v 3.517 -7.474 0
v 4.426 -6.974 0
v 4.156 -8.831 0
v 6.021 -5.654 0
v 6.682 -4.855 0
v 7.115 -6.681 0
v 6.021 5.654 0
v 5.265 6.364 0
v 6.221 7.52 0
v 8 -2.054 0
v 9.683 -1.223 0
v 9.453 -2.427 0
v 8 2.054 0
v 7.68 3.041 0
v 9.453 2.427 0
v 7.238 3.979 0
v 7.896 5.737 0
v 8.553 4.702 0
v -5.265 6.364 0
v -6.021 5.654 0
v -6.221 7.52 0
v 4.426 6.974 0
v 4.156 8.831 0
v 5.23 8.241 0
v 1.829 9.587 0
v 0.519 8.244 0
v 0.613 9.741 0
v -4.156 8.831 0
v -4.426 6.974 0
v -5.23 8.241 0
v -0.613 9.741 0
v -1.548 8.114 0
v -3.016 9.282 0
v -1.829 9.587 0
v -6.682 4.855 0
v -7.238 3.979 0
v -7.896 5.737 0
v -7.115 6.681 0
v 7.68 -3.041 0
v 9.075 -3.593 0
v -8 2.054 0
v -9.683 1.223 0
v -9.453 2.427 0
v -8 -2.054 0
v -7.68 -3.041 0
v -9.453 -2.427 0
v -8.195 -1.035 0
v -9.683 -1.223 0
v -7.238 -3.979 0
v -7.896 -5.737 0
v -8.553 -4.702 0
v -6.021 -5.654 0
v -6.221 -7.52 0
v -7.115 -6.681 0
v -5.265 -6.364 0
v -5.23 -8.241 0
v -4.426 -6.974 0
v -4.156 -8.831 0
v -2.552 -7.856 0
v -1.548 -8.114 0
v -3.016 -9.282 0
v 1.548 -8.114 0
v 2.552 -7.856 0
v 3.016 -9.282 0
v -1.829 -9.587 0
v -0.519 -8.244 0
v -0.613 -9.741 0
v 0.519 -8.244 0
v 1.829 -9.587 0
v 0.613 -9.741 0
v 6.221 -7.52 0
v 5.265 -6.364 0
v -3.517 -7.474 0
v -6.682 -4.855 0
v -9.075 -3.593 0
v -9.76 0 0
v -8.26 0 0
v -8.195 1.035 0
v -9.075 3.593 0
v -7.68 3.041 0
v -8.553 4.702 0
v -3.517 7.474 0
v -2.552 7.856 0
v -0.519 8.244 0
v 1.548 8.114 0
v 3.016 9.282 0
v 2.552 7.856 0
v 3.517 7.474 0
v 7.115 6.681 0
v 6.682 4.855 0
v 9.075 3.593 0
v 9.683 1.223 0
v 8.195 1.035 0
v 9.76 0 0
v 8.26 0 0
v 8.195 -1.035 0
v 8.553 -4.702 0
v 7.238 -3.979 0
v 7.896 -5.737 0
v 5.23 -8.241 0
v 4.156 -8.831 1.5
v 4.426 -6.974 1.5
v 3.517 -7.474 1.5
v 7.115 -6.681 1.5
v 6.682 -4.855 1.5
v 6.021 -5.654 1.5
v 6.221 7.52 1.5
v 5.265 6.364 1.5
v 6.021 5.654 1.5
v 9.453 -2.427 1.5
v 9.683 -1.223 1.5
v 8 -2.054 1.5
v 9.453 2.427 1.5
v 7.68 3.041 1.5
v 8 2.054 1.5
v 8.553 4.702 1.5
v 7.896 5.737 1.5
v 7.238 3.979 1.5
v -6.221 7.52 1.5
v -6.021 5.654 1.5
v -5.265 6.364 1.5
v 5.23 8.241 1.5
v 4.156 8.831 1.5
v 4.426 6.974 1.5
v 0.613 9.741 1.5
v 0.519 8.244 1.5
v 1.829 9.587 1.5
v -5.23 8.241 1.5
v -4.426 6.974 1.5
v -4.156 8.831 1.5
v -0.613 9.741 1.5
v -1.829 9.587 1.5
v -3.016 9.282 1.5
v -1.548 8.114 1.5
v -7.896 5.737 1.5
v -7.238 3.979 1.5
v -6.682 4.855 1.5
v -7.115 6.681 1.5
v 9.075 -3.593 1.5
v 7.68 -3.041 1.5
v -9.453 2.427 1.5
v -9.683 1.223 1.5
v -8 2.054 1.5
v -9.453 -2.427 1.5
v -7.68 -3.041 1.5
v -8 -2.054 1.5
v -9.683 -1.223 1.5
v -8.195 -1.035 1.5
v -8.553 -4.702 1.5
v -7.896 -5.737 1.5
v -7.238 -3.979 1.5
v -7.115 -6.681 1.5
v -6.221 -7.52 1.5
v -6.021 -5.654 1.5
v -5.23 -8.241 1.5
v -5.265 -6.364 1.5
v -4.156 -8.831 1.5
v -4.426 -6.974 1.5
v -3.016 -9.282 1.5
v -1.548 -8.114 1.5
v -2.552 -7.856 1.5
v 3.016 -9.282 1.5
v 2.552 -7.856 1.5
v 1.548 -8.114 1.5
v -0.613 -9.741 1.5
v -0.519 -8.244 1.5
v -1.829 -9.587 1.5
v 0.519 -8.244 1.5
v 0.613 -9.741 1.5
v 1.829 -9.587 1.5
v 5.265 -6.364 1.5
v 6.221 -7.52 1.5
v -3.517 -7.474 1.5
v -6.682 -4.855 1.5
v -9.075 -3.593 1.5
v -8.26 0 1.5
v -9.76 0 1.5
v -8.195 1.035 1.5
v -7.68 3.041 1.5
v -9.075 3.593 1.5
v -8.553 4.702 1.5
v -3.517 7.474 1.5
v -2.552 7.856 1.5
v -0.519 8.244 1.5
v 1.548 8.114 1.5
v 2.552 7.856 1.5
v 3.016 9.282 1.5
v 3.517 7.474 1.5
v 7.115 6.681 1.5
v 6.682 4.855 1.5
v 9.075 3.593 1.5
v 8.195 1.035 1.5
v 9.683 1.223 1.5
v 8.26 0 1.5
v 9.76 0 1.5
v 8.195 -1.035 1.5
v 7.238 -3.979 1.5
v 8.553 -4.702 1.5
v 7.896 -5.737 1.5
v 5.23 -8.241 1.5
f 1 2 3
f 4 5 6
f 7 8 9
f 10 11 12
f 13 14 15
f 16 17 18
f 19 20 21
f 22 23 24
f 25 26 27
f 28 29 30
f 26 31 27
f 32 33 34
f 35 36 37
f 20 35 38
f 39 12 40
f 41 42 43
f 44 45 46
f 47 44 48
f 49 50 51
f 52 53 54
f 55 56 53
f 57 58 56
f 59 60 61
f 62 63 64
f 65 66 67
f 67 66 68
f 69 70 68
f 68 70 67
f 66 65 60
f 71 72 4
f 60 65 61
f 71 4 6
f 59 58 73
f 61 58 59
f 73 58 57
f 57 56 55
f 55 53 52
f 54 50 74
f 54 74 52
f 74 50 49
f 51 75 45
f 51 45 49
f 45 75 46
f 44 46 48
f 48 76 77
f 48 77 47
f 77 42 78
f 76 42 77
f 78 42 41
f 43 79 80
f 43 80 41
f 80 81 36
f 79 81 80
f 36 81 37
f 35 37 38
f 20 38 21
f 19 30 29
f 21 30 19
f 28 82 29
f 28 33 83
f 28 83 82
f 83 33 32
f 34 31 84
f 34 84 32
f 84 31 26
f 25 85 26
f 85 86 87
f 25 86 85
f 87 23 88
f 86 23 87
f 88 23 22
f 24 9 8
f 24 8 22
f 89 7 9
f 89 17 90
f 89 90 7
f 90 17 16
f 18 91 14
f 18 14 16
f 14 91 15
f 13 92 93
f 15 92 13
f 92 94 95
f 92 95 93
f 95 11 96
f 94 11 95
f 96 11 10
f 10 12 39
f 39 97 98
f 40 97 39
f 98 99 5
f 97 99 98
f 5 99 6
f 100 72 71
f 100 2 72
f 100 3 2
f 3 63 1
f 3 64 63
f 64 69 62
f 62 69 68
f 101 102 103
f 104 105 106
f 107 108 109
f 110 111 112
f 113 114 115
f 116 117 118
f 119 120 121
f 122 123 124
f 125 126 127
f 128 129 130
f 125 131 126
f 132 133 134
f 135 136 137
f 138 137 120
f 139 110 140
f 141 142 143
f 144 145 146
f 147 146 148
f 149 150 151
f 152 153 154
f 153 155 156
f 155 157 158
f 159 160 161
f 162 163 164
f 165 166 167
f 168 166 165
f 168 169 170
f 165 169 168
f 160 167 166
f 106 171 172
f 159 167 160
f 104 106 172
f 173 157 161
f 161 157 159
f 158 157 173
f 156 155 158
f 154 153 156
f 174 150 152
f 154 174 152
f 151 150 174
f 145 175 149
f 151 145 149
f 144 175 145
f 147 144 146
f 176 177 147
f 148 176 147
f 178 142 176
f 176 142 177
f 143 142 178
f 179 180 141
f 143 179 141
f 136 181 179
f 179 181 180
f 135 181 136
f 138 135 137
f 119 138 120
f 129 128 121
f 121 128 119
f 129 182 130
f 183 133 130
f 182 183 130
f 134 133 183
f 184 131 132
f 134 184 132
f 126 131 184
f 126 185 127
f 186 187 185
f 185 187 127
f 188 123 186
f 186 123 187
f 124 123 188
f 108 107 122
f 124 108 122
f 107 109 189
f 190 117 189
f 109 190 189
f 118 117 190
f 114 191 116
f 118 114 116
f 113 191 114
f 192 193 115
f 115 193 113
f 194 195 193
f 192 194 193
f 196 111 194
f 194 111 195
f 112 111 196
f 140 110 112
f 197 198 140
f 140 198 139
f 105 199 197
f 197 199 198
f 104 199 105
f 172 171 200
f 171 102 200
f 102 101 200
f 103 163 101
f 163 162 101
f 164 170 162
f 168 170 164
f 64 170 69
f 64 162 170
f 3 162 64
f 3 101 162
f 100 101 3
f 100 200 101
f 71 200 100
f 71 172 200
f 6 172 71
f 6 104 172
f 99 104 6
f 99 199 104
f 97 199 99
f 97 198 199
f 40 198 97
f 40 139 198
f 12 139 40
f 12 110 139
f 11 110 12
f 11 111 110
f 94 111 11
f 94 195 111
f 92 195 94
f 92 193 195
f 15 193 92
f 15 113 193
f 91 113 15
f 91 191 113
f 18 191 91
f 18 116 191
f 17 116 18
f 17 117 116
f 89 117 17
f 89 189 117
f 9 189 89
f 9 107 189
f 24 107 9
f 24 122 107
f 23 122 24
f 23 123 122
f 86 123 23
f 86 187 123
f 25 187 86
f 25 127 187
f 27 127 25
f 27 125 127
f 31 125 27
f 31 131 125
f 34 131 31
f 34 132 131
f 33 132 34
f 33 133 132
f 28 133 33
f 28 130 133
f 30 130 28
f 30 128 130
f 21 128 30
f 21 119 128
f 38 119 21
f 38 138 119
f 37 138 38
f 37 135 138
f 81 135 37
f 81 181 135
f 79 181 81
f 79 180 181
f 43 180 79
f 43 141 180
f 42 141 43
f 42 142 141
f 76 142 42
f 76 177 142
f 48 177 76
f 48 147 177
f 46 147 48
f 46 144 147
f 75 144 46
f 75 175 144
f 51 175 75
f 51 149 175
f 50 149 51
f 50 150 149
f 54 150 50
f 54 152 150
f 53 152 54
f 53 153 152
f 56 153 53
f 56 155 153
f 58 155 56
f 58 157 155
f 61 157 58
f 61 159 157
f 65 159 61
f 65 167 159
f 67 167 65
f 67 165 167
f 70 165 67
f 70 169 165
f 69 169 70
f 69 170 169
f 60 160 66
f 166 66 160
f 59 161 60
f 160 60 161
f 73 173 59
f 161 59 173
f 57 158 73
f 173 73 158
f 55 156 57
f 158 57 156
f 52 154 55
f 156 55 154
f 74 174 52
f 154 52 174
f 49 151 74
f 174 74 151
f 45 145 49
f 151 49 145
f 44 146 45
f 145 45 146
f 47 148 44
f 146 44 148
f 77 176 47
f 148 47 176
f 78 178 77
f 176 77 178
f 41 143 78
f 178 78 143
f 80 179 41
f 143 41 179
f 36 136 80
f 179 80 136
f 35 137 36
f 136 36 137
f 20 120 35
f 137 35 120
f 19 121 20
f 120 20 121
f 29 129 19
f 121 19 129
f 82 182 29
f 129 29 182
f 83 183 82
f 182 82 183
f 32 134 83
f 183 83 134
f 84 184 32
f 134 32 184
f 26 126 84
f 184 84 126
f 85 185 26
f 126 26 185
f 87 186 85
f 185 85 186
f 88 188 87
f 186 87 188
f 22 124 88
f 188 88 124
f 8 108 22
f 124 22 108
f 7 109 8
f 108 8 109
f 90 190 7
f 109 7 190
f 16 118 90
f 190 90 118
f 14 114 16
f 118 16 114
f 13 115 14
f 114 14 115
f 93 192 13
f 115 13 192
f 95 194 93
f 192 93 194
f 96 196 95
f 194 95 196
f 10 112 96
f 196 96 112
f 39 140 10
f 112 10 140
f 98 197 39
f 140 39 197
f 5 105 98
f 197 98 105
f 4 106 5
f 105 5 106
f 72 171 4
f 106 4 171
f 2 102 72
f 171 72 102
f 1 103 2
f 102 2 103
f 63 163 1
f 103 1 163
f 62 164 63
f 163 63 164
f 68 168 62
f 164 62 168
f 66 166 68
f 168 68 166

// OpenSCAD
$fn = 50;

diameter = 16.52; //actual
thick    = 1.5;   //actual


radius   = diameter/2;


linear_extrude(thick){
	difference(){
		circle(r=radius+thick);
		circle(r=radius);
	}
}
